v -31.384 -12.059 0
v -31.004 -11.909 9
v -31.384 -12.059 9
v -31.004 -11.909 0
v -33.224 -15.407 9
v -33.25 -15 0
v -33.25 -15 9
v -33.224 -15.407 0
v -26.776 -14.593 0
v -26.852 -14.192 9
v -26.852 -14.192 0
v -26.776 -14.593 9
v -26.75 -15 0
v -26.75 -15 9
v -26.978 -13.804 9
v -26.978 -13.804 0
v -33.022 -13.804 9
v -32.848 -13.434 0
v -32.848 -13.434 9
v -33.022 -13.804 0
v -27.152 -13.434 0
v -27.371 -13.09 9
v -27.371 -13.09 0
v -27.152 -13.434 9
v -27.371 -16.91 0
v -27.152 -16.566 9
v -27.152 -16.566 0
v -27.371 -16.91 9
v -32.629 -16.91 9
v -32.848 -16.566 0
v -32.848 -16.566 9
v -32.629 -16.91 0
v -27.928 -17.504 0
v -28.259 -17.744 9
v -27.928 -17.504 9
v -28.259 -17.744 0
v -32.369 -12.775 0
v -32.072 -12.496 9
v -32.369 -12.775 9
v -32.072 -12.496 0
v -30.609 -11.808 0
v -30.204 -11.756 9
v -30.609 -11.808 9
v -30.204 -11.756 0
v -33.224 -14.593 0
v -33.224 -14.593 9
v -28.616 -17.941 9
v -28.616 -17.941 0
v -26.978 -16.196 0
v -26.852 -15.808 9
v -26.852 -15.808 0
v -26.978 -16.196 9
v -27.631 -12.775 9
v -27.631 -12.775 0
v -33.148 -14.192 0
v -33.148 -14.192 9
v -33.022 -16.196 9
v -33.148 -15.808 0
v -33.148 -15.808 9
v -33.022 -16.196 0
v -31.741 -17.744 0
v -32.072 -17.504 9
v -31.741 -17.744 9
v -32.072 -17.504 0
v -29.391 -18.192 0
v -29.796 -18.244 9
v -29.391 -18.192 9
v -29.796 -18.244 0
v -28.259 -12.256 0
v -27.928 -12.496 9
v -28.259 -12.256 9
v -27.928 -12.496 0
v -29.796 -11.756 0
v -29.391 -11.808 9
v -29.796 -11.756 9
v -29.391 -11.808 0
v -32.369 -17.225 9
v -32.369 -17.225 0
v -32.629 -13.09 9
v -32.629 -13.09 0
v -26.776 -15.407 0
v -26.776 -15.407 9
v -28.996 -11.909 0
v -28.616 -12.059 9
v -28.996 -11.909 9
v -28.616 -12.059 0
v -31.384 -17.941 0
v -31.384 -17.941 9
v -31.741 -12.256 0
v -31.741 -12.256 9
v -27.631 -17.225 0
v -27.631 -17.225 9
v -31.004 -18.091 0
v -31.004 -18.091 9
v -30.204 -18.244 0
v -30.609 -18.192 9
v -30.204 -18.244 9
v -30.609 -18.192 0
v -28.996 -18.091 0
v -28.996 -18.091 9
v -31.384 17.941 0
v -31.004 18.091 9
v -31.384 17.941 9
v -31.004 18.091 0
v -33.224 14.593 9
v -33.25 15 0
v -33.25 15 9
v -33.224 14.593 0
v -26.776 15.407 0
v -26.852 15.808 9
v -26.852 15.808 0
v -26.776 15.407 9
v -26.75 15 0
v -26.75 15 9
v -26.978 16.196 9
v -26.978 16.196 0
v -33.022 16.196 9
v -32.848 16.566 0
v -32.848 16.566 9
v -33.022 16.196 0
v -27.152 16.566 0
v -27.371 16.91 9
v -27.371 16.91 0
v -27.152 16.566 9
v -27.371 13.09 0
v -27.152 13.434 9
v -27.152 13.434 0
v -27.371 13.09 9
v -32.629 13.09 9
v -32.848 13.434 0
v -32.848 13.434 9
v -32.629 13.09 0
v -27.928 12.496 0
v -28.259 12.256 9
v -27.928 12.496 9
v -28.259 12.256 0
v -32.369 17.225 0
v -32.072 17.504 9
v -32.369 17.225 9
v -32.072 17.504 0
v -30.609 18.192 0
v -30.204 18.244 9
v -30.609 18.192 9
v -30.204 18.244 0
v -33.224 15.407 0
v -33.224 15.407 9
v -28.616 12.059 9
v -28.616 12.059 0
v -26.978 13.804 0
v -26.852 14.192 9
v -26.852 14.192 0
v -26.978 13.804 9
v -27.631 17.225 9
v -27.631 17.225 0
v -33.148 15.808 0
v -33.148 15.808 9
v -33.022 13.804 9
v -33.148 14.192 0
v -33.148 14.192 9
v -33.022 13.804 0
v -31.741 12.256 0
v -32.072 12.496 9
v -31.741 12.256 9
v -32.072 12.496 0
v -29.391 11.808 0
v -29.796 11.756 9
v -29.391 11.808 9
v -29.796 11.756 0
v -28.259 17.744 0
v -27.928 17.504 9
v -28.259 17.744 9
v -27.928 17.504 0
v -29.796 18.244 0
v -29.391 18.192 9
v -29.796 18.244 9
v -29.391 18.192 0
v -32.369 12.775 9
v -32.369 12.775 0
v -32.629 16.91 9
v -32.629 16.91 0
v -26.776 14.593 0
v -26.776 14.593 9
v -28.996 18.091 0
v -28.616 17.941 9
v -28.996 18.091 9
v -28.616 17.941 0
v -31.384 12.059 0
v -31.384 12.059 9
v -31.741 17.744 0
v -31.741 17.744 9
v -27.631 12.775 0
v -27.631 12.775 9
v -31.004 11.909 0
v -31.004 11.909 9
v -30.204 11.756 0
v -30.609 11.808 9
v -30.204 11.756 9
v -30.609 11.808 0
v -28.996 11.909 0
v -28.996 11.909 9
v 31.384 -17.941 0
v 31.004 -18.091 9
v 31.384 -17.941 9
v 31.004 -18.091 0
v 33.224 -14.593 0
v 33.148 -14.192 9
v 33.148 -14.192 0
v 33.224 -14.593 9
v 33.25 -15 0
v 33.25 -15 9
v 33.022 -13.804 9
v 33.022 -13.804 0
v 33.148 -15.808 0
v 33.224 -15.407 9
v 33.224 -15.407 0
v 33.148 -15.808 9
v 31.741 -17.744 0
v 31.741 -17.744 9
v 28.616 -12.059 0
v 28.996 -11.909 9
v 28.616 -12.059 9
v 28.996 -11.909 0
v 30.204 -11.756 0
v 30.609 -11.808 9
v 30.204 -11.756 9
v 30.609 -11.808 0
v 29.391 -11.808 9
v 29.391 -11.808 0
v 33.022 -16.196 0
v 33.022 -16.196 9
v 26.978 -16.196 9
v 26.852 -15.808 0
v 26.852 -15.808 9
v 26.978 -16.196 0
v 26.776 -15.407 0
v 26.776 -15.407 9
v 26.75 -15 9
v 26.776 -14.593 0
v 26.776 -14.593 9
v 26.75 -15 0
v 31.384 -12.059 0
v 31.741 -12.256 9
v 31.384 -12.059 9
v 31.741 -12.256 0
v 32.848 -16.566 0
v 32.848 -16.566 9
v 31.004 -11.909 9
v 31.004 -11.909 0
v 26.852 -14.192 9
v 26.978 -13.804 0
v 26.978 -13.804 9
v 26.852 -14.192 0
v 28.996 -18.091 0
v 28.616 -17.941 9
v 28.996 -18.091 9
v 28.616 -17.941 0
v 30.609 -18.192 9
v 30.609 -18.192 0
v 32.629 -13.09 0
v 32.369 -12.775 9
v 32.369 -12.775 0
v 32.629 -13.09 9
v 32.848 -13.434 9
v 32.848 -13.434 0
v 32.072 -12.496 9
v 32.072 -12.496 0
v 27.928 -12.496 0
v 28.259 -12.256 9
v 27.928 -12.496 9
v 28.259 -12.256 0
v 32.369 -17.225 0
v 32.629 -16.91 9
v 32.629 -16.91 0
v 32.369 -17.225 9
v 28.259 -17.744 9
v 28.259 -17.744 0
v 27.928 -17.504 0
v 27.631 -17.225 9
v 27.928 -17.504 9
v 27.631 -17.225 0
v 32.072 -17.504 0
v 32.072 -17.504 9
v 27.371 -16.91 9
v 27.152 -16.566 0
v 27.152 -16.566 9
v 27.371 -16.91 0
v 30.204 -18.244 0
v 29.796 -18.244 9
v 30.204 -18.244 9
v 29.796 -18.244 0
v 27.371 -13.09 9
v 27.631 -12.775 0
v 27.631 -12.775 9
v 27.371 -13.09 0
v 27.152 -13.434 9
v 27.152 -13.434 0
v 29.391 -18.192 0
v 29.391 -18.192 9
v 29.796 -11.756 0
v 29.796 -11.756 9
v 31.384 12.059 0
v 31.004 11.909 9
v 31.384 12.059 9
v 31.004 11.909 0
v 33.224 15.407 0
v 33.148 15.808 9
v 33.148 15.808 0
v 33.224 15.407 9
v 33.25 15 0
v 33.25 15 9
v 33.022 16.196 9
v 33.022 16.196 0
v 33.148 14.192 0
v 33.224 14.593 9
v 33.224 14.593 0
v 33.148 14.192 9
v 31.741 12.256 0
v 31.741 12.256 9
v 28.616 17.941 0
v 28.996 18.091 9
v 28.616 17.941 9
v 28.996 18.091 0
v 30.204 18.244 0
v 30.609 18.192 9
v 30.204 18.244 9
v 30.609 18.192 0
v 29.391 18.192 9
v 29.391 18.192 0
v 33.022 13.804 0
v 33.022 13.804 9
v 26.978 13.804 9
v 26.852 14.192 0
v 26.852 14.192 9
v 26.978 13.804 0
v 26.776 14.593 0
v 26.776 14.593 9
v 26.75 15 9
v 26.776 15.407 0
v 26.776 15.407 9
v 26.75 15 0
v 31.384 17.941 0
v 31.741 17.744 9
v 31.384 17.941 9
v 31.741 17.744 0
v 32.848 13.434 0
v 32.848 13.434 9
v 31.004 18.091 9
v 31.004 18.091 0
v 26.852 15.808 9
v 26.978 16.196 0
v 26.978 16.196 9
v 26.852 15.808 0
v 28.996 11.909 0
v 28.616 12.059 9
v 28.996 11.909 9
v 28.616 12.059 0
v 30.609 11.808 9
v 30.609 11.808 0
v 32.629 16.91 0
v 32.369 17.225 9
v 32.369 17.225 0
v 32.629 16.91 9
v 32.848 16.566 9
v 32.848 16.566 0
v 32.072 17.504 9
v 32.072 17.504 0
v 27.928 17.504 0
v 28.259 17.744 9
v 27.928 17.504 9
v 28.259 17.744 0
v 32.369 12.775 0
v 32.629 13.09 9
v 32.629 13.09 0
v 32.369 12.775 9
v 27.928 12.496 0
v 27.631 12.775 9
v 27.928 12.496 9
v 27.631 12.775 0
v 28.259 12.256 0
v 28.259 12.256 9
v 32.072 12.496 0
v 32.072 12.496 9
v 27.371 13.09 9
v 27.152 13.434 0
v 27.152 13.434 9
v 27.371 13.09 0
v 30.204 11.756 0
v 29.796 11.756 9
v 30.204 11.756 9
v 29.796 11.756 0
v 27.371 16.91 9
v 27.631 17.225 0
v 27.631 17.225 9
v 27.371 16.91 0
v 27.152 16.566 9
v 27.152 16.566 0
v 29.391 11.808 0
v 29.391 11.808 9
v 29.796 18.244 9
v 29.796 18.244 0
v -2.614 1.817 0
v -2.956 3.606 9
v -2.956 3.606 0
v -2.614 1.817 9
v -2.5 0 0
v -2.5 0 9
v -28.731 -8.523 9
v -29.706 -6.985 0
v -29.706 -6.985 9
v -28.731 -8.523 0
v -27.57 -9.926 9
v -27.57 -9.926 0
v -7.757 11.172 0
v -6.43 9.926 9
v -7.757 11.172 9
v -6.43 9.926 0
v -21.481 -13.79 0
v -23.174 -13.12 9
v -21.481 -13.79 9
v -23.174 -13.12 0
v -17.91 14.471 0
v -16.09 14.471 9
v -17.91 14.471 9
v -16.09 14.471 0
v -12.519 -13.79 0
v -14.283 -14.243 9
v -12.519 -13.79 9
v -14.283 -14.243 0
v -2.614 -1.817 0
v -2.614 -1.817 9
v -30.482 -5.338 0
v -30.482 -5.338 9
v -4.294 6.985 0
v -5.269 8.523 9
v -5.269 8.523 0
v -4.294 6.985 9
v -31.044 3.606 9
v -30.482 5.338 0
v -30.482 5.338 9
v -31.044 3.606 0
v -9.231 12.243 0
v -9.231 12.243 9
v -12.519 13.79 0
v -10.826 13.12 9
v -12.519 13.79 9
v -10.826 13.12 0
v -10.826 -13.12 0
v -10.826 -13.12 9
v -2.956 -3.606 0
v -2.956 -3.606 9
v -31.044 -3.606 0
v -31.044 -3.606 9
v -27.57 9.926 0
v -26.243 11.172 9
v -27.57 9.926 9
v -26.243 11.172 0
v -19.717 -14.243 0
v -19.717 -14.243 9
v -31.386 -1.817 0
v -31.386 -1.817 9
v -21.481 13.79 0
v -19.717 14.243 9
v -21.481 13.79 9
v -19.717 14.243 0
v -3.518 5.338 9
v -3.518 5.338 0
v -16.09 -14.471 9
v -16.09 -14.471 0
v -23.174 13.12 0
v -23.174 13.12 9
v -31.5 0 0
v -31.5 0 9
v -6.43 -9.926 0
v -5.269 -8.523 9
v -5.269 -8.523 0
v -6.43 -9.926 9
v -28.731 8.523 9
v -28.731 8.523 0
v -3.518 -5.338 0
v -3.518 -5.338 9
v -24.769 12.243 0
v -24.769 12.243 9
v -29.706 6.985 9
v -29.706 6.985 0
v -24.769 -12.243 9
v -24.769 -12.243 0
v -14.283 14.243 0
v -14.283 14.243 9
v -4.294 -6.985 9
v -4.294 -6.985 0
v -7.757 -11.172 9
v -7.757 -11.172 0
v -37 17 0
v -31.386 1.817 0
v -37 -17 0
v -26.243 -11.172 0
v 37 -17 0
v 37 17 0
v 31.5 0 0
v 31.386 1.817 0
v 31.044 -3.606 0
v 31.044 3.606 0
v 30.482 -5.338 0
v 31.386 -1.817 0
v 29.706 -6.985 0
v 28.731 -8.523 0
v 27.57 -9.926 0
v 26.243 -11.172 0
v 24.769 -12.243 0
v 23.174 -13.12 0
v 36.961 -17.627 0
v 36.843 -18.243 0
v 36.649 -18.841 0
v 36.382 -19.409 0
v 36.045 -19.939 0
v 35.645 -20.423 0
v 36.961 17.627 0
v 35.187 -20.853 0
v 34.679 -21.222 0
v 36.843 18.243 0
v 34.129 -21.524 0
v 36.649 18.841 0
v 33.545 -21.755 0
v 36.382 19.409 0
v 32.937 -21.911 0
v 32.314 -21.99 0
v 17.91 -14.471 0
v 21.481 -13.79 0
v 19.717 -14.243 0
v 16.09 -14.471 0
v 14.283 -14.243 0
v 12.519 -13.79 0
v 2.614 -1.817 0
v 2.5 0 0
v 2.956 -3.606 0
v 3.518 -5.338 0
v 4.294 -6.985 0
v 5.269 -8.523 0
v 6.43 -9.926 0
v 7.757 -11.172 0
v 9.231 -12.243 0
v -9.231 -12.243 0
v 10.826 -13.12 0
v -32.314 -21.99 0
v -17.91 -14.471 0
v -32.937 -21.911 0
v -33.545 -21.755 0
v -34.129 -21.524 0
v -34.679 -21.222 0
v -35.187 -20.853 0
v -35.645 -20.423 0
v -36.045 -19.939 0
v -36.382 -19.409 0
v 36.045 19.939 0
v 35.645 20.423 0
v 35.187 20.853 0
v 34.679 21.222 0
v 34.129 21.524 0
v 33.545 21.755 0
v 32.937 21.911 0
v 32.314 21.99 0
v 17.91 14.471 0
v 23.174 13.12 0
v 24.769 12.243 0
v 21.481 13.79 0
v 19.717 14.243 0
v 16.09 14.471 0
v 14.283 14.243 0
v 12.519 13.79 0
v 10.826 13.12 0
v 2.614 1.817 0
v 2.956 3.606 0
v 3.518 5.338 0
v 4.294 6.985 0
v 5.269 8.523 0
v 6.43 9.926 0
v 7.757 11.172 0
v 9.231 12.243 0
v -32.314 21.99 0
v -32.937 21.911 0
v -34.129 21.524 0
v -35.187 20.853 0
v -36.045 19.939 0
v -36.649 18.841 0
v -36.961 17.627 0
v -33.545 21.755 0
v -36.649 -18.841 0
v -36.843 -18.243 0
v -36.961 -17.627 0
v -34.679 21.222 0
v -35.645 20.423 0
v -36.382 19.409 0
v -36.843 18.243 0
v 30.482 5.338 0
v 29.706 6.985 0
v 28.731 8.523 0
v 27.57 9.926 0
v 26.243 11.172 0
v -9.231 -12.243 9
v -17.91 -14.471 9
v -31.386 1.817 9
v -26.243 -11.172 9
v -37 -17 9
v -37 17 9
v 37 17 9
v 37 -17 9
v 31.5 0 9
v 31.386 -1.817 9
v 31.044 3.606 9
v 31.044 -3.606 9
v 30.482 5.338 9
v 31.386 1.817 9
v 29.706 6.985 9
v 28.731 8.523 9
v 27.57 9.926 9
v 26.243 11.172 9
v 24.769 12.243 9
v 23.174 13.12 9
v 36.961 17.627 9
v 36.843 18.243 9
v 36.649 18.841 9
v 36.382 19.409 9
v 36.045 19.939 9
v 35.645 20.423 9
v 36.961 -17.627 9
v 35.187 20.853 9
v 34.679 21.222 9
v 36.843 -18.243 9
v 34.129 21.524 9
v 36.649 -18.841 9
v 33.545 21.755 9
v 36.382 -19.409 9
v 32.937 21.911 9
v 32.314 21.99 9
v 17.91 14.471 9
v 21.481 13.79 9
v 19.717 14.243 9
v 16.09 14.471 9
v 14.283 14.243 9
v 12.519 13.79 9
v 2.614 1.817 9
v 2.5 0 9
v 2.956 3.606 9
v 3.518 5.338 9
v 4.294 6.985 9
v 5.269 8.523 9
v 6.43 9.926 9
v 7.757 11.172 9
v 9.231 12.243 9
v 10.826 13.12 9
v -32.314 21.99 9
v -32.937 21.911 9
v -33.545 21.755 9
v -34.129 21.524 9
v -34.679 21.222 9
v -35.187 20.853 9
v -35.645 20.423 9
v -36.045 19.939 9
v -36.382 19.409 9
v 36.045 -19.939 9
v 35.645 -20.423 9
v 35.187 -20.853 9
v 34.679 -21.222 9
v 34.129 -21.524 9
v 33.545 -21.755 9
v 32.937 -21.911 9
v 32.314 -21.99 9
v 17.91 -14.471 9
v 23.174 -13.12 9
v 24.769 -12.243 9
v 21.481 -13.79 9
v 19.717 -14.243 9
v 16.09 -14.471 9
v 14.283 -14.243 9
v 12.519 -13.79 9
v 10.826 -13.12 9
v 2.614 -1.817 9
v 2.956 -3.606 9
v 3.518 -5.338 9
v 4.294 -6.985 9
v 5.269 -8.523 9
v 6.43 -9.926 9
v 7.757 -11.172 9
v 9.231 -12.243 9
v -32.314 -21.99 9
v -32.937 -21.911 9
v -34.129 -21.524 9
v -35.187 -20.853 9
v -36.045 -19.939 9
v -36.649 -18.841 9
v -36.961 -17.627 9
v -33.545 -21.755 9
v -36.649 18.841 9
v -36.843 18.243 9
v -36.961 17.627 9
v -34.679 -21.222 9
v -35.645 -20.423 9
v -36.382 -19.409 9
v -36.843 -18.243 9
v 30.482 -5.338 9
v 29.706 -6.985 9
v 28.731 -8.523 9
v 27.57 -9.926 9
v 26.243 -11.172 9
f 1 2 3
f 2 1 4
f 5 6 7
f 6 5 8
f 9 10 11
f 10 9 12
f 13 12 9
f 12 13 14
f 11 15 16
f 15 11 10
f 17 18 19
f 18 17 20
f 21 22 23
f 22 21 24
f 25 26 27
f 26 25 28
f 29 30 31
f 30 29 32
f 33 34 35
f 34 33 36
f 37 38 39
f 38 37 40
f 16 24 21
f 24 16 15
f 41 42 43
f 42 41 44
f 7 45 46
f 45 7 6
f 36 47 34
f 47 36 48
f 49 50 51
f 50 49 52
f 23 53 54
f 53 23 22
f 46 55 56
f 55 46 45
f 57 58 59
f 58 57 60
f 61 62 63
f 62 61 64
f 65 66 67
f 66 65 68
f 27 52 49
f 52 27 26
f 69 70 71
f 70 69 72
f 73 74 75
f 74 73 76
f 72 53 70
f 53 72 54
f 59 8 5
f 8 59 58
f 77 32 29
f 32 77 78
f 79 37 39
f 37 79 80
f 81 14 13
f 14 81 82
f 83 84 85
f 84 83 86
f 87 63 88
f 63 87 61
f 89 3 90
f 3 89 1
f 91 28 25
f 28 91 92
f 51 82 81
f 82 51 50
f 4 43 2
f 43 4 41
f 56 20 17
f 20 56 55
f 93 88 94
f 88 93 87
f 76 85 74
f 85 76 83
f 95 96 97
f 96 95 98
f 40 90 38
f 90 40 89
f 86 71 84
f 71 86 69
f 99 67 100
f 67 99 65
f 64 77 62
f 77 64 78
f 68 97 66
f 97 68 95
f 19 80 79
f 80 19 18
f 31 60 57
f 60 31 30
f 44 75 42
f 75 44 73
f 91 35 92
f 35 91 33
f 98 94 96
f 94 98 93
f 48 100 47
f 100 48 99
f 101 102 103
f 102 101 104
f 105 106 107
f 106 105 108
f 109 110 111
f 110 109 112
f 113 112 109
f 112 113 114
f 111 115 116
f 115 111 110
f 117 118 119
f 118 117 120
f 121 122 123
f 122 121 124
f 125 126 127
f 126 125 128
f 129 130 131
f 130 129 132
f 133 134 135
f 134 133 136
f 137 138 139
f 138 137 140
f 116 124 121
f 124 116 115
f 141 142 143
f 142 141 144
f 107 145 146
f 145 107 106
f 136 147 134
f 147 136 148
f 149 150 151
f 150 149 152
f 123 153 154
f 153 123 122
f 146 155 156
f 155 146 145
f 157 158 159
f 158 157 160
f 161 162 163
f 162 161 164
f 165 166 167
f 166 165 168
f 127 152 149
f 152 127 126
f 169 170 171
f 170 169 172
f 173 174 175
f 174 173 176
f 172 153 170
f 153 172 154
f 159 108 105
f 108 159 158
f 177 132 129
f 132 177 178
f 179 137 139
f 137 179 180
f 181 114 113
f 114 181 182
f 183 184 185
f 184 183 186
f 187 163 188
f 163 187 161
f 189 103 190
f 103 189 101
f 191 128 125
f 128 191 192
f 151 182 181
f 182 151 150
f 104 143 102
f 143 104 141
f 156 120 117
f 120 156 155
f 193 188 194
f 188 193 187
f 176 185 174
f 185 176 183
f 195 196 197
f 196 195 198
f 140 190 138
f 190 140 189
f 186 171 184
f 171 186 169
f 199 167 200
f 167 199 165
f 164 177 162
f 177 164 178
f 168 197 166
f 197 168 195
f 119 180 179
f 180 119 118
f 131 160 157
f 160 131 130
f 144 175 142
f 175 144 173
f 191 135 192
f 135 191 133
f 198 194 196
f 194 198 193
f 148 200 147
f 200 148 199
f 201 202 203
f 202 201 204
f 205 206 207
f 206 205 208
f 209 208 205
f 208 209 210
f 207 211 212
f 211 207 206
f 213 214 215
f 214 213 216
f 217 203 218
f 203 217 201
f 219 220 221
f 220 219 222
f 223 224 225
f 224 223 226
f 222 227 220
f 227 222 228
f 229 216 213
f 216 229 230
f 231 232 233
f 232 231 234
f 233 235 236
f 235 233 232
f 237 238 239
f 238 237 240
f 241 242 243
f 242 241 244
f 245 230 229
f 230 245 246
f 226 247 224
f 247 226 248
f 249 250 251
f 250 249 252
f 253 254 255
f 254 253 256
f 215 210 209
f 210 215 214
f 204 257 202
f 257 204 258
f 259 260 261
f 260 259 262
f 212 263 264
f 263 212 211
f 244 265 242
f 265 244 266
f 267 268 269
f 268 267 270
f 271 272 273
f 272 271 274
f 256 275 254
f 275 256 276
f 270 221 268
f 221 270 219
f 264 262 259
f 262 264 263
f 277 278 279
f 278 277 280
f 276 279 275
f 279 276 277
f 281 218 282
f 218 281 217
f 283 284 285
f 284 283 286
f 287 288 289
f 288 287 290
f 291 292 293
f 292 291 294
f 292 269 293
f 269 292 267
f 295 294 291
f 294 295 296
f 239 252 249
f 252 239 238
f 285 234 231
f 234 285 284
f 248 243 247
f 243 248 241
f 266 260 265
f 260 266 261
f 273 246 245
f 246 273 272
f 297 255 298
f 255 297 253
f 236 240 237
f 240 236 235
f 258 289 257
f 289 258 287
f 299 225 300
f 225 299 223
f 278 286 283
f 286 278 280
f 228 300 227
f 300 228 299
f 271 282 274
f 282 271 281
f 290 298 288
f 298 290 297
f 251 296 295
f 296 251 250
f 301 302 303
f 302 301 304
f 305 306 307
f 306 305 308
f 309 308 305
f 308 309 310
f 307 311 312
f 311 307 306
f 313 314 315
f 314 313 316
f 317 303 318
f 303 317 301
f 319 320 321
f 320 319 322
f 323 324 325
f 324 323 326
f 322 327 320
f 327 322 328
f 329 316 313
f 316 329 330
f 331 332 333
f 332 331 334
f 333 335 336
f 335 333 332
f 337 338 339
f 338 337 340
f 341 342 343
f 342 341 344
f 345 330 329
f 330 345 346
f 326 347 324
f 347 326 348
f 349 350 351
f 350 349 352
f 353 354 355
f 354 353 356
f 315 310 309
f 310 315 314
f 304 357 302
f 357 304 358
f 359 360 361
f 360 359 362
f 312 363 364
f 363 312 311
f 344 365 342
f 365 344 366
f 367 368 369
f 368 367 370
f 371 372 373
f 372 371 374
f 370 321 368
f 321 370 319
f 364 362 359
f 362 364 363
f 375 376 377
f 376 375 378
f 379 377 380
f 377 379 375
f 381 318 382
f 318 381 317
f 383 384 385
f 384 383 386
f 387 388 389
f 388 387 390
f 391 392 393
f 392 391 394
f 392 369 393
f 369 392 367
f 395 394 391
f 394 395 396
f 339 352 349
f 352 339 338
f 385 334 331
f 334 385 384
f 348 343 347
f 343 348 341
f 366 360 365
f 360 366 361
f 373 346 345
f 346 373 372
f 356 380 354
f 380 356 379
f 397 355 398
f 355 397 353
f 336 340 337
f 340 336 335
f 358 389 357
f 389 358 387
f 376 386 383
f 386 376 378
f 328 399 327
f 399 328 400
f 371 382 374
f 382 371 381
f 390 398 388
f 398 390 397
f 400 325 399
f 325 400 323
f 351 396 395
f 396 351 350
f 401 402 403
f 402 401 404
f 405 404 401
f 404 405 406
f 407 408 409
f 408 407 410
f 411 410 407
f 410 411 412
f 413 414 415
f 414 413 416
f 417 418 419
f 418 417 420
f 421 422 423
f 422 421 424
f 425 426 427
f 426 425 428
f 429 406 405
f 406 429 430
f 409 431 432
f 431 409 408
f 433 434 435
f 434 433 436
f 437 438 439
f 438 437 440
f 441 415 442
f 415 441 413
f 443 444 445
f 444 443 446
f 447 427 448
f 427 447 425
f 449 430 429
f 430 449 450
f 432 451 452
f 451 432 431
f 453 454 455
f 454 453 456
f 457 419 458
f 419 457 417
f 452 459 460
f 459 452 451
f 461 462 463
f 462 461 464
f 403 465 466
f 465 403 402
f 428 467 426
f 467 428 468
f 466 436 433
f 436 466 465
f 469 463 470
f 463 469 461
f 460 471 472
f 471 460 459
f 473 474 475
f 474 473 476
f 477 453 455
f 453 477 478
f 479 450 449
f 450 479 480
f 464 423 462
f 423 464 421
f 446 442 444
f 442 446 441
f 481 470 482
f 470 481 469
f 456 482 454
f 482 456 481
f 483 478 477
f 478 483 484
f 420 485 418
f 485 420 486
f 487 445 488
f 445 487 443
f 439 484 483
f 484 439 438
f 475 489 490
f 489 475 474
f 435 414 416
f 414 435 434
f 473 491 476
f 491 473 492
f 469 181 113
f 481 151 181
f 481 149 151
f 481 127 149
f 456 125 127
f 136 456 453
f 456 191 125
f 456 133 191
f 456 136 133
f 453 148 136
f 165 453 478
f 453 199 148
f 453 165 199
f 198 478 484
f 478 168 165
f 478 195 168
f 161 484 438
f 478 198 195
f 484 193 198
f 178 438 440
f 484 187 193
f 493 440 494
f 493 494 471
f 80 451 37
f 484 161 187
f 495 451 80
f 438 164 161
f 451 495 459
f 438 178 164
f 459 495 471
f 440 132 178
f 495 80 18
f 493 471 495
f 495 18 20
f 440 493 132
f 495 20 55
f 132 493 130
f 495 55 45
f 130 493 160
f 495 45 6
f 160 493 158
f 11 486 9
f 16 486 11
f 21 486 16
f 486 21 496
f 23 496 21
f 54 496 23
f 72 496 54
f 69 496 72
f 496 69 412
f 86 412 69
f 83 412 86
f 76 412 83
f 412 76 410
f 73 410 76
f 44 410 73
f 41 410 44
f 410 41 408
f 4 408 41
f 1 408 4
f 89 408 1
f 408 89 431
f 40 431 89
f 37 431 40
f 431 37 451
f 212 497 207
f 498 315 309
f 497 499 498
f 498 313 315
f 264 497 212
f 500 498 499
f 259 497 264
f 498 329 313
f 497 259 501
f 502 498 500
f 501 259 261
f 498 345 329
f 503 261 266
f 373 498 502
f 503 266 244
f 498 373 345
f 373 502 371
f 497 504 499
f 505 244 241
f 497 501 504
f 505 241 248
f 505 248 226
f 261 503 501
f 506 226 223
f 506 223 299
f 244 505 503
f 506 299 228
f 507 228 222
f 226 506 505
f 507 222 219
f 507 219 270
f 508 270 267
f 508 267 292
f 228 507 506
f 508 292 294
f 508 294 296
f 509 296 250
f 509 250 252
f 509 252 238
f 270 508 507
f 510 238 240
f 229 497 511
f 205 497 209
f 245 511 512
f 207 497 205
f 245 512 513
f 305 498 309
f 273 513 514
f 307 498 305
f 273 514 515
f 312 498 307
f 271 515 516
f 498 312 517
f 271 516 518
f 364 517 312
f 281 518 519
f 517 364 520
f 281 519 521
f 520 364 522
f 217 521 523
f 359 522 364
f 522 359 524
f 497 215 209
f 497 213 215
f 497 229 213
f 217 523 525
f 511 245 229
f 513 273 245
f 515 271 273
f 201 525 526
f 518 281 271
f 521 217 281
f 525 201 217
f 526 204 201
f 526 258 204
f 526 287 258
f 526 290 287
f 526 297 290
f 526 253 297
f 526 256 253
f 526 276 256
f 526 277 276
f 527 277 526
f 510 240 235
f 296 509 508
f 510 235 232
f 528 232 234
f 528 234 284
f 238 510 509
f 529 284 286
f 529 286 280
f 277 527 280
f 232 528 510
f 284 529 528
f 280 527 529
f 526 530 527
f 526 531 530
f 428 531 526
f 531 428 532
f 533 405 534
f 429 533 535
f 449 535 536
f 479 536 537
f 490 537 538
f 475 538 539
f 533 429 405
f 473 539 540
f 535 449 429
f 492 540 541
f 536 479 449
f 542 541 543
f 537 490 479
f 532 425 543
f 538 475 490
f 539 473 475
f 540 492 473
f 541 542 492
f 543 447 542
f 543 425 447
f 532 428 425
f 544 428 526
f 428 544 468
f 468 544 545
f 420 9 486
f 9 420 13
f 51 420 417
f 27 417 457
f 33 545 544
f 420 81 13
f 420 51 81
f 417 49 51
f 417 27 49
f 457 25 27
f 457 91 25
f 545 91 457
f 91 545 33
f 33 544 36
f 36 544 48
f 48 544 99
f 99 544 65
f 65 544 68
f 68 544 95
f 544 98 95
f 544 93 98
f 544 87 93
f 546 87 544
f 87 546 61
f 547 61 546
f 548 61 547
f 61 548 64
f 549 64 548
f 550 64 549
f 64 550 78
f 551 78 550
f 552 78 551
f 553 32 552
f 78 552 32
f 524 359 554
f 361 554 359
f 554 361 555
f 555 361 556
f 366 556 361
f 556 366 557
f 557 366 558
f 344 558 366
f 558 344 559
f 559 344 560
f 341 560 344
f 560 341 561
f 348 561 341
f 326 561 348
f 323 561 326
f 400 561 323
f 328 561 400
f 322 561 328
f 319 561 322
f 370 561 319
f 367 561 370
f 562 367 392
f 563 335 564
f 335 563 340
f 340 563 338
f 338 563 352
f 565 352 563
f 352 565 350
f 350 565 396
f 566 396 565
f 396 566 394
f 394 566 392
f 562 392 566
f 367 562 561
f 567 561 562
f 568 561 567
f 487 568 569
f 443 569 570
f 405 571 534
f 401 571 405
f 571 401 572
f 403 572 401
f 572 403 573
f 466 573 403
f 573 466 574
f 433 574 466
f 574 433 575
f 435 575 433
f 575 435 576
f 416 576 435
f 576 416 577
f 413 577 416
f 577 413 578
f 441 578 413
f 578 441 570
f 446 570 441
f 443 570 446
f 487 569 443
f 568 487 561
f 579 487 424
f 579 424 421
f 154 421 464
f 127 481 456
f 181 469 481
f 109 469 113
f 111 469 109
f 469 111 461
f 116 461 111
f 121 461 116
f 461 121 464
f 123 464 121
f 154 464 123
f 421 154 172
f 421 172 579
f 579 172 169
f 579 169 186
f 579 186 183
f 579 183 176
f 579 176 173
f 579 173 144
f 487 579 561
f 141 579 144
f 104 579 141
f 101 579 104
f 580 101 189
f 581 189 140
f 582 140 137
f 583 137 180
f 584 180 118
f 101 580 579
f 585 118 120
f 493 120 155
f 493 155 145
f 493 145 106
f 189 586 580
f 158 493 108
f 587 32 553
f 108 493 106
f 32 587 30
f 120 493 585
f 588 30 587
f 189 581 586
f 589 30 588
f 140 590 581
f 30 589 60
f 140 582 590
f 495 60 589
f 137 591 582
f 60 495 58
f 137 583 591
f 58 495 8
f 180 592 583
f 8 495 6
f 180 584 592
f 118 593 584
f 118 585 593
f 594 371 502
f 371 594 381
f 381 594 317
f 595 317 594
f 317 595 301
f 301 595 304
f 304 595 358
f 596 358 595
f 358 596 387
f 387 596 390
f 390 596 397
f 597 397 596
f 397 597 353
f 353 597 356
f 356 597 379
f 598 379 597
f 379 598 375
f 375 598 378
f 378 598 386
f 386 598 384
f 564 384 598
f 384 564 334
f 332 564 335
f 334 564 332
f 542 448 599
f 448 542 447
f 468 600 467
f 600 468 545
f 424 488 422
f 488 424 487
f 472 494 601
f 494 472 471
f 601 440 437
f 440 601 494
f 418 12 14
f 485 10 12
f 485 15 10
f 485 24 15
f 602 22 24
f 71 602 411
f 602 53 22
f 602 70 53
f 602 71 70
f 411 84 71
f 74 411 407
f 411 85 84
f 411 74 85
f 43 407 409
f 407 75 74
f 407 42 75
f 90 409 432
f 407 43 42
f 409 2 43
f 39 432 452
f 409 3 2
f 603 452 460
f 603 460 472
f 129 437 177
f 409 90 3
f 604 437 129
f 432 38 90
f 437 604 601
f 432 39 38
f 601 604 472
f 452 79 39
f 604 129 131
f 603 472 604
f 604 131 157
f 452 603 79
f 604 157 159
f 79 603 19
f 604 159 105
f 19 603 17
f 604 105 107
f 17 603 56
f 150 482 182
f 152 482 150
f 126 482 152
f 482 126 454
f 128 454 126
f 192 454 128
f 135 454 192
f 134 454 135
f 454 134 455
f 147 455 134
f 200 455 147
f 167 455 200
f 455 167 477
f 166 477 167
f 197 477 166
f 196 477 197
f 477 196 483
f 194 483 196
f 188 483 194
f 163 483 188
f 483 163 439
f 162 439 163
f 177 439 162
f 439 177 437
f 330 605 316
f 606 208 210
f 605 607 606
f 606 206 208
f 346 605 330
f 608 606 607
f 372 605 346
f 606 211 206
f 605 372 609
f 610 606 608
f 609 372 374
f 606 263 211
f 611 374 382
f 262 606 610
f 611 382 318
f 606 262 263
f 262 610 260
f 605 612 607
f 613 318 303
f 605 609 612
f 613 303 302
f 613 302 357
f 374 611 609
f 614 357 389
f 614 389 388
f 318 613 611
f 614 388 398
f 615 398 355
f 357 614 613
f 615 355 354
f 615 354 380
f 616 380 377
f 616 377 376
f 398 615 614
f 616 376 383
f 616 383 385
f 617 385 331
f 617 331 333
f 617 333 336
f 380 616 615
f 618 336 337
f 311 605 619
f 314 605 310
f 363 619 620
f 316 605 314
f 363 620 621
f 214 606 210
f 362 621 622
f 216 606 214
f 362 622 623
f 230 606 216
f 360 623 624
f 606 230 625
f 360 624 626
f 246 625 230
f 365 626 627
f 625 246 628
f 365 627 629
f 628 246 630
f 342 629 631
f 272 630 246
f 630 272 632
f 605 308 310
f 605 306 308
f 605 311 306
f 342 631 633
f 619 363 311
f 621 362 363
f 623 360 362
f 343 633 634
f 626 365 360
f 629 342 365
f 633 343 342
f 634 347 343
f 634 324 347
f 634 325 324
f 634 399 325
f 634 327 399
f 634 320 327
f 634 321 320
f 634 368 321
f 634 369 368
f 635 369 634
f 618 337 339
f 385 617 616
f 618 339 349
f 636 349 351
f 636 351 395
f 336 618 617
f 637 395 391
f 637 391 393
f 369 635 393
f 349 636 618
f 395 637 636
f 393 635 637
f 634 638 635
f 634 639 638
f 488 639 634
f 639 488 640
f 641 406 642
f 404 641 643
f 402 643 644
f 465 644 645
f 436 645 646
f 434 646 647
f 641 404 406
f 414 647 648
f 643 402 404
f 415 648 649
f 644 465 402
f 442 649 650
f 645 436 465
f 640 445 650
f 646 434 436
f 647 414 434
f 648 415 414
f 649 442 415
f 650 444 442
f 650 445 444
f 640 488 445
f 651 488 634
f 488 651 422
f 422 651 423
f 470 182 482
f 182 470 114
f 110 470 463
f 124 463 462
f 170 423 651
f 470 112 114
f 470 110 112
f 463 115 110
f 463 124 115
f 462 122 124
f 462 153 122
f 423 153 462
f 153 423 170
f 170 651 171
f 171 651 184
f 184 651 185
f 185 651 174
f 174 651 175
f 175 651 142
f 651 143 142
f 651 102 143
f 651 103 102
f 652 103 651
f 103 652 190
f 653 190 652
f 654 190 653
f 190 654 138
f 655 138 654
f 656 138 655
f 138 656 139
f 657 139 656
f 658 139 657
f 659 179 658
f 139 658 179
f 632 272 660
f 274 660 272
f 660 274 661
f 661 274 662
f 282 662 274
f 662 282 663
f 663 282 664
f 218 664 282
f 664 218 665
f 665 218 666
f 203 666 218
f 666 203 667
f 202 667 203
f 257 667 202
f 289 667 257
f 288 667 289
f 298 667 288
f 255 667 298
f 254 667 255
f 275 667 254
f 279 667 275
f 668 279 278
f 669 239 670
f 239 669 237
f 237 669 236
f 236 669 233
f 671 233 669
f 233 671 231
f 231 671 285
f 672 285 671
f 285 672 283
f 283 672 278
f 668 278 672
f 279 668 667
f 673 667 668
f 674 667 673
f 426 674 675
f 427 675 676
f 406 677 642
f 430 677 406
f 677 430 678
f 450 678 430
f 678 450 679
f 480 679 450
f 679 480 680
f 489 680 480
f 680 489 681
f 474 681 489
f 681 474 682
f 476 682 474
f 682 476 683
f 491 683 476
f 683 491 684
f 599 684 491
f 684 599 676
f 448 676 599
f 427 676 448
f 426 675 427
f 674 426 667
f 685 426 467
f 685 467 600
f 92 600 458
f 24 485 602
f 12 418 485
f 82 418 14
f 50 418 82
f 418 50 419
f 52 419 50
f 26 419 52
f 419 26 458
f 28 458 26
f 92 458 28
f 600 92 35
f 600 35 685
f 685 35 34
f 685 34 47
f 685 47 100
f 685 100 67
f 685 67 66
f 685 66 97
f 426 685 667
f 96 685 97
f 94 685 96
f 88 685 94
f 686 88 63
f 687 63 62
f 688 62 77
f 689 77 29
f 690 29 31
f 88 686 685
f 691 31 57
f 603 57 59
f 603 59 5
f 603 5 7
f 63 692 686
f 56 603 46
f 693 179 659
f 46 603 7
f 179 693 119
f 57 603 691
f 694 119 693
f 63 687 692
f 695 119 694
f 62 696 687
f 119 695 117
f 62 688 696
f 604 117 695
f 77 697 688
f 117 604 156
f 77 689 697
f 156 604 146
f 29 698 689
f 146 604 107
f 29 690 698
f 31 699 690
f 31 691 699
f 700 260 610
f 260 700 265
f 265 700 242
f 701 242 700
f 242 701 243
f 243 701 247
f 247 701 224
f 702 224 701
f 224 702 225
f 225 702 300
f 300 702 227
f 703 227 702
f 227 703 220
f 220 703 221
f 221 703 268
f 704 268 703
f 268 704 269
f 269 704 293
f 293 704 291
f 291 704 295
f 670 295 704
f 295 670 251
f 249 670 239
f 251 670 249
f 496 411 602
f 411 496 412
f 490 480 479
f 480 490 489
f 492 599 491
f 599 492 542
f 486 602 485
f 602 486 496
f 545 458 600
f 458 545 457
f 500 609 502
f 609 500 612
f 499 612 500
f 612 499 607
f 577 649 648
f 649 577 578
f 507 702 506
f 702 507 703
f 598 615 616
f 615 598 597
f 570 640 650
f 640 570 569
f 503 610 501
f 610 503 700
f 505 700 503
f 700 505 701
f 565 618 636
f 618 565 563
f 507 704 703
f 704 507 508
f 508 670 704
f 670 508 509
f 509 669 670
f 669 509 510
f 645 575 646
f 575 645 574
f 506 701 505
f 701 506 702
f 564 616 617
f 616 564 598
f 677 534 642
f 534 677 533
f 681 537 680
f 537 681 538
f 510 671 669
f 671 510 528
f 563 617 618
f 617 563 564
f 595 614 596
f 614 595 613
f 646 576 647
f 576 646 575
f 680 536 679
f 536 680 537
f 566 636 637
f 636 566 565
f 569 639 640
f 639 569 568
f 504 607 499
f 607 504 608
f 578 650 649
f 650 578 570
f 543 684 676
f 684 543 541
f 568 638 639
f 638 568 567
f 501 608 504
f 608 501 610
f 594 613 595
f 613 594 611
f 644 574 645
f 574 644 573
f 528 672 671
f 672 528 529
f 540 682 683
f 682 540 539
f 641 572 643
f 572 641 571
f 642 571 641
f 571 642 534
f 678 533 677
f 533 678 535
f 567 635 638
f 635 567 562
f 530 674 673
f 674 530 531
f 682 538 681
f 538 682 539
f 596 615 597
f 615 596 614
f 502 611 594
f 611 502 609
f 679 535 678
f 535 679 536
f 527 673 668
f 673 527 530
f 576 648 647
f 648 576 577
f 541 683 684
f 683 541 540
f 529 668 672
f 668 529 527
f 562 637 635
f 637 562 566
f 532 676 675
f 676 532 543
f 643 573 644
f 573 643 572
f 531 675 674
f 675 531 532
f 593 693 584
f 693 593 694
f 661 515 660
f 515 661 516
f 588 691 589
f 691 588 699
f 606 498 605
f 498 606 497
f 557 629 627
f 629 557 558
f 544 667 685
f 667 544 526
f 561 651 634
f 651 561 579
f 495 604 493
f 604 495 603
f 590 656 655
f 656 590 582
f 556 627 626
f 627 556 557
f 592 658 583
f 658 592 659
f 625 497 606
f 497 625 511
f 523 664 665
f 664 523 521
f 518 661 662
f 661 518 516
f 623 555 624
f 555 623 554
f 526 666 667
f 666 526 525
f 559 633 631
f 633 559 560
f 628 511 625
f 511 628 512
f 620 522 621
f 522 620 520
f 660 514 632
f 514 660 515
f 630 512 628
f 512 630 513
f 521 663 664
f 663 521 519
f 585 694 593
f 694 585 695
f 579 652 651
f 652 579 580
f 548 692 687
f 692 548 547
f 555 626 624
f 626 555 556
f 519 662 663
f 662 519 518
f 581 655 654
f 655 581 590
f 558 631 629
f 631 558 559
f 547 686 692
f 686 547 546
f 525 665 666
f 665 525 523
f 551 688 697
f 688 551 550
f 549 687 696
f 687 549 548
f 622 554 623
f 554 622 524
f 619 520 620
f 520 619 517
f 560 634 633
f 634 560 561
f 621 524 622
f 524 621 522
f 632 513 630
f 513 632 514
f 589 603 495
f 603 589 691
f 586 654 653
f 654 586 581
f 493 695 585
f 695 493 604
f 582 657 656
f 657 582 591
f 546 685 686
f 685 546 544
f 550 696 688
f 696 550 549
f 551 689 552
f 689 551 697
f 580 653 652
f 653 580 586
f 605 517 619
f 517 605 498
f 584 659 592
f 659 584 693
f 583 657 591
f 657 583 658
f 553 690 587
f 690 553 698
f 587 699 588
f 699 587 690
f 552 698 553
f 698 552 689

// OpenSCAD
$fn = 50;

difference() {
	union() {
		hull() {
			translate(v = [-32.0, 17.0, 0]) {
				cylinder(h = 9, r = 5);
			}
			translate(v = [32.0, 17.0, 0]) {
				cylinder(h = 9, r = 5);
			}
			translate(v = [-32.0, -17.0, 0]) {
				cylinder(h = 9, r = 5);
			}
			translate(v = [32.0, -17.0, 0]) {
				cylinder(h = 9, r = 5);
			}
		}
	}
	union() {
		translate(v = [-30.0, -15.0, -100.0]) {
			cylinder(h = 200, r = 3.25);
		}
		translate(v = [-30.0, 15.0, -100.0]) {
			cylinder(h = 200, r = 3.25);
		}
		translate(v = [30.0, -15.0, -100.0]) {
			cylinder(h = 200, r = 3.25);
		}
		translate(v = [30.0, 15.0, -100.0]) {
			cylinder(h = 200, r = 3.25);
		}
		translate(v = [-30.0, -15.0, -100.0]) {
			cylinder(h = 200, r = 1.8);
		}
		translate(v = [-30.0, 15.0, -100.0]) {
			cylinder(h = 200, r = 1.8);
		}
		translate(v = [30.0, -15.0, -100.0]) {
			cylinder(h = 200, r = 1.8);
		}
		translate(v = [30.0, 15.0, -100.0]) {
			cylinder(h = 200, r = 1.8);
		}
		translate(v = [-17.0, 0, 0.0]) {
			cylinder(h = 9, r = 14.5);
		}
		translate(v = [17.0, 0, 0.0]) {
			cylinder(h = 9, r = 14.5);
		}
	}
}
